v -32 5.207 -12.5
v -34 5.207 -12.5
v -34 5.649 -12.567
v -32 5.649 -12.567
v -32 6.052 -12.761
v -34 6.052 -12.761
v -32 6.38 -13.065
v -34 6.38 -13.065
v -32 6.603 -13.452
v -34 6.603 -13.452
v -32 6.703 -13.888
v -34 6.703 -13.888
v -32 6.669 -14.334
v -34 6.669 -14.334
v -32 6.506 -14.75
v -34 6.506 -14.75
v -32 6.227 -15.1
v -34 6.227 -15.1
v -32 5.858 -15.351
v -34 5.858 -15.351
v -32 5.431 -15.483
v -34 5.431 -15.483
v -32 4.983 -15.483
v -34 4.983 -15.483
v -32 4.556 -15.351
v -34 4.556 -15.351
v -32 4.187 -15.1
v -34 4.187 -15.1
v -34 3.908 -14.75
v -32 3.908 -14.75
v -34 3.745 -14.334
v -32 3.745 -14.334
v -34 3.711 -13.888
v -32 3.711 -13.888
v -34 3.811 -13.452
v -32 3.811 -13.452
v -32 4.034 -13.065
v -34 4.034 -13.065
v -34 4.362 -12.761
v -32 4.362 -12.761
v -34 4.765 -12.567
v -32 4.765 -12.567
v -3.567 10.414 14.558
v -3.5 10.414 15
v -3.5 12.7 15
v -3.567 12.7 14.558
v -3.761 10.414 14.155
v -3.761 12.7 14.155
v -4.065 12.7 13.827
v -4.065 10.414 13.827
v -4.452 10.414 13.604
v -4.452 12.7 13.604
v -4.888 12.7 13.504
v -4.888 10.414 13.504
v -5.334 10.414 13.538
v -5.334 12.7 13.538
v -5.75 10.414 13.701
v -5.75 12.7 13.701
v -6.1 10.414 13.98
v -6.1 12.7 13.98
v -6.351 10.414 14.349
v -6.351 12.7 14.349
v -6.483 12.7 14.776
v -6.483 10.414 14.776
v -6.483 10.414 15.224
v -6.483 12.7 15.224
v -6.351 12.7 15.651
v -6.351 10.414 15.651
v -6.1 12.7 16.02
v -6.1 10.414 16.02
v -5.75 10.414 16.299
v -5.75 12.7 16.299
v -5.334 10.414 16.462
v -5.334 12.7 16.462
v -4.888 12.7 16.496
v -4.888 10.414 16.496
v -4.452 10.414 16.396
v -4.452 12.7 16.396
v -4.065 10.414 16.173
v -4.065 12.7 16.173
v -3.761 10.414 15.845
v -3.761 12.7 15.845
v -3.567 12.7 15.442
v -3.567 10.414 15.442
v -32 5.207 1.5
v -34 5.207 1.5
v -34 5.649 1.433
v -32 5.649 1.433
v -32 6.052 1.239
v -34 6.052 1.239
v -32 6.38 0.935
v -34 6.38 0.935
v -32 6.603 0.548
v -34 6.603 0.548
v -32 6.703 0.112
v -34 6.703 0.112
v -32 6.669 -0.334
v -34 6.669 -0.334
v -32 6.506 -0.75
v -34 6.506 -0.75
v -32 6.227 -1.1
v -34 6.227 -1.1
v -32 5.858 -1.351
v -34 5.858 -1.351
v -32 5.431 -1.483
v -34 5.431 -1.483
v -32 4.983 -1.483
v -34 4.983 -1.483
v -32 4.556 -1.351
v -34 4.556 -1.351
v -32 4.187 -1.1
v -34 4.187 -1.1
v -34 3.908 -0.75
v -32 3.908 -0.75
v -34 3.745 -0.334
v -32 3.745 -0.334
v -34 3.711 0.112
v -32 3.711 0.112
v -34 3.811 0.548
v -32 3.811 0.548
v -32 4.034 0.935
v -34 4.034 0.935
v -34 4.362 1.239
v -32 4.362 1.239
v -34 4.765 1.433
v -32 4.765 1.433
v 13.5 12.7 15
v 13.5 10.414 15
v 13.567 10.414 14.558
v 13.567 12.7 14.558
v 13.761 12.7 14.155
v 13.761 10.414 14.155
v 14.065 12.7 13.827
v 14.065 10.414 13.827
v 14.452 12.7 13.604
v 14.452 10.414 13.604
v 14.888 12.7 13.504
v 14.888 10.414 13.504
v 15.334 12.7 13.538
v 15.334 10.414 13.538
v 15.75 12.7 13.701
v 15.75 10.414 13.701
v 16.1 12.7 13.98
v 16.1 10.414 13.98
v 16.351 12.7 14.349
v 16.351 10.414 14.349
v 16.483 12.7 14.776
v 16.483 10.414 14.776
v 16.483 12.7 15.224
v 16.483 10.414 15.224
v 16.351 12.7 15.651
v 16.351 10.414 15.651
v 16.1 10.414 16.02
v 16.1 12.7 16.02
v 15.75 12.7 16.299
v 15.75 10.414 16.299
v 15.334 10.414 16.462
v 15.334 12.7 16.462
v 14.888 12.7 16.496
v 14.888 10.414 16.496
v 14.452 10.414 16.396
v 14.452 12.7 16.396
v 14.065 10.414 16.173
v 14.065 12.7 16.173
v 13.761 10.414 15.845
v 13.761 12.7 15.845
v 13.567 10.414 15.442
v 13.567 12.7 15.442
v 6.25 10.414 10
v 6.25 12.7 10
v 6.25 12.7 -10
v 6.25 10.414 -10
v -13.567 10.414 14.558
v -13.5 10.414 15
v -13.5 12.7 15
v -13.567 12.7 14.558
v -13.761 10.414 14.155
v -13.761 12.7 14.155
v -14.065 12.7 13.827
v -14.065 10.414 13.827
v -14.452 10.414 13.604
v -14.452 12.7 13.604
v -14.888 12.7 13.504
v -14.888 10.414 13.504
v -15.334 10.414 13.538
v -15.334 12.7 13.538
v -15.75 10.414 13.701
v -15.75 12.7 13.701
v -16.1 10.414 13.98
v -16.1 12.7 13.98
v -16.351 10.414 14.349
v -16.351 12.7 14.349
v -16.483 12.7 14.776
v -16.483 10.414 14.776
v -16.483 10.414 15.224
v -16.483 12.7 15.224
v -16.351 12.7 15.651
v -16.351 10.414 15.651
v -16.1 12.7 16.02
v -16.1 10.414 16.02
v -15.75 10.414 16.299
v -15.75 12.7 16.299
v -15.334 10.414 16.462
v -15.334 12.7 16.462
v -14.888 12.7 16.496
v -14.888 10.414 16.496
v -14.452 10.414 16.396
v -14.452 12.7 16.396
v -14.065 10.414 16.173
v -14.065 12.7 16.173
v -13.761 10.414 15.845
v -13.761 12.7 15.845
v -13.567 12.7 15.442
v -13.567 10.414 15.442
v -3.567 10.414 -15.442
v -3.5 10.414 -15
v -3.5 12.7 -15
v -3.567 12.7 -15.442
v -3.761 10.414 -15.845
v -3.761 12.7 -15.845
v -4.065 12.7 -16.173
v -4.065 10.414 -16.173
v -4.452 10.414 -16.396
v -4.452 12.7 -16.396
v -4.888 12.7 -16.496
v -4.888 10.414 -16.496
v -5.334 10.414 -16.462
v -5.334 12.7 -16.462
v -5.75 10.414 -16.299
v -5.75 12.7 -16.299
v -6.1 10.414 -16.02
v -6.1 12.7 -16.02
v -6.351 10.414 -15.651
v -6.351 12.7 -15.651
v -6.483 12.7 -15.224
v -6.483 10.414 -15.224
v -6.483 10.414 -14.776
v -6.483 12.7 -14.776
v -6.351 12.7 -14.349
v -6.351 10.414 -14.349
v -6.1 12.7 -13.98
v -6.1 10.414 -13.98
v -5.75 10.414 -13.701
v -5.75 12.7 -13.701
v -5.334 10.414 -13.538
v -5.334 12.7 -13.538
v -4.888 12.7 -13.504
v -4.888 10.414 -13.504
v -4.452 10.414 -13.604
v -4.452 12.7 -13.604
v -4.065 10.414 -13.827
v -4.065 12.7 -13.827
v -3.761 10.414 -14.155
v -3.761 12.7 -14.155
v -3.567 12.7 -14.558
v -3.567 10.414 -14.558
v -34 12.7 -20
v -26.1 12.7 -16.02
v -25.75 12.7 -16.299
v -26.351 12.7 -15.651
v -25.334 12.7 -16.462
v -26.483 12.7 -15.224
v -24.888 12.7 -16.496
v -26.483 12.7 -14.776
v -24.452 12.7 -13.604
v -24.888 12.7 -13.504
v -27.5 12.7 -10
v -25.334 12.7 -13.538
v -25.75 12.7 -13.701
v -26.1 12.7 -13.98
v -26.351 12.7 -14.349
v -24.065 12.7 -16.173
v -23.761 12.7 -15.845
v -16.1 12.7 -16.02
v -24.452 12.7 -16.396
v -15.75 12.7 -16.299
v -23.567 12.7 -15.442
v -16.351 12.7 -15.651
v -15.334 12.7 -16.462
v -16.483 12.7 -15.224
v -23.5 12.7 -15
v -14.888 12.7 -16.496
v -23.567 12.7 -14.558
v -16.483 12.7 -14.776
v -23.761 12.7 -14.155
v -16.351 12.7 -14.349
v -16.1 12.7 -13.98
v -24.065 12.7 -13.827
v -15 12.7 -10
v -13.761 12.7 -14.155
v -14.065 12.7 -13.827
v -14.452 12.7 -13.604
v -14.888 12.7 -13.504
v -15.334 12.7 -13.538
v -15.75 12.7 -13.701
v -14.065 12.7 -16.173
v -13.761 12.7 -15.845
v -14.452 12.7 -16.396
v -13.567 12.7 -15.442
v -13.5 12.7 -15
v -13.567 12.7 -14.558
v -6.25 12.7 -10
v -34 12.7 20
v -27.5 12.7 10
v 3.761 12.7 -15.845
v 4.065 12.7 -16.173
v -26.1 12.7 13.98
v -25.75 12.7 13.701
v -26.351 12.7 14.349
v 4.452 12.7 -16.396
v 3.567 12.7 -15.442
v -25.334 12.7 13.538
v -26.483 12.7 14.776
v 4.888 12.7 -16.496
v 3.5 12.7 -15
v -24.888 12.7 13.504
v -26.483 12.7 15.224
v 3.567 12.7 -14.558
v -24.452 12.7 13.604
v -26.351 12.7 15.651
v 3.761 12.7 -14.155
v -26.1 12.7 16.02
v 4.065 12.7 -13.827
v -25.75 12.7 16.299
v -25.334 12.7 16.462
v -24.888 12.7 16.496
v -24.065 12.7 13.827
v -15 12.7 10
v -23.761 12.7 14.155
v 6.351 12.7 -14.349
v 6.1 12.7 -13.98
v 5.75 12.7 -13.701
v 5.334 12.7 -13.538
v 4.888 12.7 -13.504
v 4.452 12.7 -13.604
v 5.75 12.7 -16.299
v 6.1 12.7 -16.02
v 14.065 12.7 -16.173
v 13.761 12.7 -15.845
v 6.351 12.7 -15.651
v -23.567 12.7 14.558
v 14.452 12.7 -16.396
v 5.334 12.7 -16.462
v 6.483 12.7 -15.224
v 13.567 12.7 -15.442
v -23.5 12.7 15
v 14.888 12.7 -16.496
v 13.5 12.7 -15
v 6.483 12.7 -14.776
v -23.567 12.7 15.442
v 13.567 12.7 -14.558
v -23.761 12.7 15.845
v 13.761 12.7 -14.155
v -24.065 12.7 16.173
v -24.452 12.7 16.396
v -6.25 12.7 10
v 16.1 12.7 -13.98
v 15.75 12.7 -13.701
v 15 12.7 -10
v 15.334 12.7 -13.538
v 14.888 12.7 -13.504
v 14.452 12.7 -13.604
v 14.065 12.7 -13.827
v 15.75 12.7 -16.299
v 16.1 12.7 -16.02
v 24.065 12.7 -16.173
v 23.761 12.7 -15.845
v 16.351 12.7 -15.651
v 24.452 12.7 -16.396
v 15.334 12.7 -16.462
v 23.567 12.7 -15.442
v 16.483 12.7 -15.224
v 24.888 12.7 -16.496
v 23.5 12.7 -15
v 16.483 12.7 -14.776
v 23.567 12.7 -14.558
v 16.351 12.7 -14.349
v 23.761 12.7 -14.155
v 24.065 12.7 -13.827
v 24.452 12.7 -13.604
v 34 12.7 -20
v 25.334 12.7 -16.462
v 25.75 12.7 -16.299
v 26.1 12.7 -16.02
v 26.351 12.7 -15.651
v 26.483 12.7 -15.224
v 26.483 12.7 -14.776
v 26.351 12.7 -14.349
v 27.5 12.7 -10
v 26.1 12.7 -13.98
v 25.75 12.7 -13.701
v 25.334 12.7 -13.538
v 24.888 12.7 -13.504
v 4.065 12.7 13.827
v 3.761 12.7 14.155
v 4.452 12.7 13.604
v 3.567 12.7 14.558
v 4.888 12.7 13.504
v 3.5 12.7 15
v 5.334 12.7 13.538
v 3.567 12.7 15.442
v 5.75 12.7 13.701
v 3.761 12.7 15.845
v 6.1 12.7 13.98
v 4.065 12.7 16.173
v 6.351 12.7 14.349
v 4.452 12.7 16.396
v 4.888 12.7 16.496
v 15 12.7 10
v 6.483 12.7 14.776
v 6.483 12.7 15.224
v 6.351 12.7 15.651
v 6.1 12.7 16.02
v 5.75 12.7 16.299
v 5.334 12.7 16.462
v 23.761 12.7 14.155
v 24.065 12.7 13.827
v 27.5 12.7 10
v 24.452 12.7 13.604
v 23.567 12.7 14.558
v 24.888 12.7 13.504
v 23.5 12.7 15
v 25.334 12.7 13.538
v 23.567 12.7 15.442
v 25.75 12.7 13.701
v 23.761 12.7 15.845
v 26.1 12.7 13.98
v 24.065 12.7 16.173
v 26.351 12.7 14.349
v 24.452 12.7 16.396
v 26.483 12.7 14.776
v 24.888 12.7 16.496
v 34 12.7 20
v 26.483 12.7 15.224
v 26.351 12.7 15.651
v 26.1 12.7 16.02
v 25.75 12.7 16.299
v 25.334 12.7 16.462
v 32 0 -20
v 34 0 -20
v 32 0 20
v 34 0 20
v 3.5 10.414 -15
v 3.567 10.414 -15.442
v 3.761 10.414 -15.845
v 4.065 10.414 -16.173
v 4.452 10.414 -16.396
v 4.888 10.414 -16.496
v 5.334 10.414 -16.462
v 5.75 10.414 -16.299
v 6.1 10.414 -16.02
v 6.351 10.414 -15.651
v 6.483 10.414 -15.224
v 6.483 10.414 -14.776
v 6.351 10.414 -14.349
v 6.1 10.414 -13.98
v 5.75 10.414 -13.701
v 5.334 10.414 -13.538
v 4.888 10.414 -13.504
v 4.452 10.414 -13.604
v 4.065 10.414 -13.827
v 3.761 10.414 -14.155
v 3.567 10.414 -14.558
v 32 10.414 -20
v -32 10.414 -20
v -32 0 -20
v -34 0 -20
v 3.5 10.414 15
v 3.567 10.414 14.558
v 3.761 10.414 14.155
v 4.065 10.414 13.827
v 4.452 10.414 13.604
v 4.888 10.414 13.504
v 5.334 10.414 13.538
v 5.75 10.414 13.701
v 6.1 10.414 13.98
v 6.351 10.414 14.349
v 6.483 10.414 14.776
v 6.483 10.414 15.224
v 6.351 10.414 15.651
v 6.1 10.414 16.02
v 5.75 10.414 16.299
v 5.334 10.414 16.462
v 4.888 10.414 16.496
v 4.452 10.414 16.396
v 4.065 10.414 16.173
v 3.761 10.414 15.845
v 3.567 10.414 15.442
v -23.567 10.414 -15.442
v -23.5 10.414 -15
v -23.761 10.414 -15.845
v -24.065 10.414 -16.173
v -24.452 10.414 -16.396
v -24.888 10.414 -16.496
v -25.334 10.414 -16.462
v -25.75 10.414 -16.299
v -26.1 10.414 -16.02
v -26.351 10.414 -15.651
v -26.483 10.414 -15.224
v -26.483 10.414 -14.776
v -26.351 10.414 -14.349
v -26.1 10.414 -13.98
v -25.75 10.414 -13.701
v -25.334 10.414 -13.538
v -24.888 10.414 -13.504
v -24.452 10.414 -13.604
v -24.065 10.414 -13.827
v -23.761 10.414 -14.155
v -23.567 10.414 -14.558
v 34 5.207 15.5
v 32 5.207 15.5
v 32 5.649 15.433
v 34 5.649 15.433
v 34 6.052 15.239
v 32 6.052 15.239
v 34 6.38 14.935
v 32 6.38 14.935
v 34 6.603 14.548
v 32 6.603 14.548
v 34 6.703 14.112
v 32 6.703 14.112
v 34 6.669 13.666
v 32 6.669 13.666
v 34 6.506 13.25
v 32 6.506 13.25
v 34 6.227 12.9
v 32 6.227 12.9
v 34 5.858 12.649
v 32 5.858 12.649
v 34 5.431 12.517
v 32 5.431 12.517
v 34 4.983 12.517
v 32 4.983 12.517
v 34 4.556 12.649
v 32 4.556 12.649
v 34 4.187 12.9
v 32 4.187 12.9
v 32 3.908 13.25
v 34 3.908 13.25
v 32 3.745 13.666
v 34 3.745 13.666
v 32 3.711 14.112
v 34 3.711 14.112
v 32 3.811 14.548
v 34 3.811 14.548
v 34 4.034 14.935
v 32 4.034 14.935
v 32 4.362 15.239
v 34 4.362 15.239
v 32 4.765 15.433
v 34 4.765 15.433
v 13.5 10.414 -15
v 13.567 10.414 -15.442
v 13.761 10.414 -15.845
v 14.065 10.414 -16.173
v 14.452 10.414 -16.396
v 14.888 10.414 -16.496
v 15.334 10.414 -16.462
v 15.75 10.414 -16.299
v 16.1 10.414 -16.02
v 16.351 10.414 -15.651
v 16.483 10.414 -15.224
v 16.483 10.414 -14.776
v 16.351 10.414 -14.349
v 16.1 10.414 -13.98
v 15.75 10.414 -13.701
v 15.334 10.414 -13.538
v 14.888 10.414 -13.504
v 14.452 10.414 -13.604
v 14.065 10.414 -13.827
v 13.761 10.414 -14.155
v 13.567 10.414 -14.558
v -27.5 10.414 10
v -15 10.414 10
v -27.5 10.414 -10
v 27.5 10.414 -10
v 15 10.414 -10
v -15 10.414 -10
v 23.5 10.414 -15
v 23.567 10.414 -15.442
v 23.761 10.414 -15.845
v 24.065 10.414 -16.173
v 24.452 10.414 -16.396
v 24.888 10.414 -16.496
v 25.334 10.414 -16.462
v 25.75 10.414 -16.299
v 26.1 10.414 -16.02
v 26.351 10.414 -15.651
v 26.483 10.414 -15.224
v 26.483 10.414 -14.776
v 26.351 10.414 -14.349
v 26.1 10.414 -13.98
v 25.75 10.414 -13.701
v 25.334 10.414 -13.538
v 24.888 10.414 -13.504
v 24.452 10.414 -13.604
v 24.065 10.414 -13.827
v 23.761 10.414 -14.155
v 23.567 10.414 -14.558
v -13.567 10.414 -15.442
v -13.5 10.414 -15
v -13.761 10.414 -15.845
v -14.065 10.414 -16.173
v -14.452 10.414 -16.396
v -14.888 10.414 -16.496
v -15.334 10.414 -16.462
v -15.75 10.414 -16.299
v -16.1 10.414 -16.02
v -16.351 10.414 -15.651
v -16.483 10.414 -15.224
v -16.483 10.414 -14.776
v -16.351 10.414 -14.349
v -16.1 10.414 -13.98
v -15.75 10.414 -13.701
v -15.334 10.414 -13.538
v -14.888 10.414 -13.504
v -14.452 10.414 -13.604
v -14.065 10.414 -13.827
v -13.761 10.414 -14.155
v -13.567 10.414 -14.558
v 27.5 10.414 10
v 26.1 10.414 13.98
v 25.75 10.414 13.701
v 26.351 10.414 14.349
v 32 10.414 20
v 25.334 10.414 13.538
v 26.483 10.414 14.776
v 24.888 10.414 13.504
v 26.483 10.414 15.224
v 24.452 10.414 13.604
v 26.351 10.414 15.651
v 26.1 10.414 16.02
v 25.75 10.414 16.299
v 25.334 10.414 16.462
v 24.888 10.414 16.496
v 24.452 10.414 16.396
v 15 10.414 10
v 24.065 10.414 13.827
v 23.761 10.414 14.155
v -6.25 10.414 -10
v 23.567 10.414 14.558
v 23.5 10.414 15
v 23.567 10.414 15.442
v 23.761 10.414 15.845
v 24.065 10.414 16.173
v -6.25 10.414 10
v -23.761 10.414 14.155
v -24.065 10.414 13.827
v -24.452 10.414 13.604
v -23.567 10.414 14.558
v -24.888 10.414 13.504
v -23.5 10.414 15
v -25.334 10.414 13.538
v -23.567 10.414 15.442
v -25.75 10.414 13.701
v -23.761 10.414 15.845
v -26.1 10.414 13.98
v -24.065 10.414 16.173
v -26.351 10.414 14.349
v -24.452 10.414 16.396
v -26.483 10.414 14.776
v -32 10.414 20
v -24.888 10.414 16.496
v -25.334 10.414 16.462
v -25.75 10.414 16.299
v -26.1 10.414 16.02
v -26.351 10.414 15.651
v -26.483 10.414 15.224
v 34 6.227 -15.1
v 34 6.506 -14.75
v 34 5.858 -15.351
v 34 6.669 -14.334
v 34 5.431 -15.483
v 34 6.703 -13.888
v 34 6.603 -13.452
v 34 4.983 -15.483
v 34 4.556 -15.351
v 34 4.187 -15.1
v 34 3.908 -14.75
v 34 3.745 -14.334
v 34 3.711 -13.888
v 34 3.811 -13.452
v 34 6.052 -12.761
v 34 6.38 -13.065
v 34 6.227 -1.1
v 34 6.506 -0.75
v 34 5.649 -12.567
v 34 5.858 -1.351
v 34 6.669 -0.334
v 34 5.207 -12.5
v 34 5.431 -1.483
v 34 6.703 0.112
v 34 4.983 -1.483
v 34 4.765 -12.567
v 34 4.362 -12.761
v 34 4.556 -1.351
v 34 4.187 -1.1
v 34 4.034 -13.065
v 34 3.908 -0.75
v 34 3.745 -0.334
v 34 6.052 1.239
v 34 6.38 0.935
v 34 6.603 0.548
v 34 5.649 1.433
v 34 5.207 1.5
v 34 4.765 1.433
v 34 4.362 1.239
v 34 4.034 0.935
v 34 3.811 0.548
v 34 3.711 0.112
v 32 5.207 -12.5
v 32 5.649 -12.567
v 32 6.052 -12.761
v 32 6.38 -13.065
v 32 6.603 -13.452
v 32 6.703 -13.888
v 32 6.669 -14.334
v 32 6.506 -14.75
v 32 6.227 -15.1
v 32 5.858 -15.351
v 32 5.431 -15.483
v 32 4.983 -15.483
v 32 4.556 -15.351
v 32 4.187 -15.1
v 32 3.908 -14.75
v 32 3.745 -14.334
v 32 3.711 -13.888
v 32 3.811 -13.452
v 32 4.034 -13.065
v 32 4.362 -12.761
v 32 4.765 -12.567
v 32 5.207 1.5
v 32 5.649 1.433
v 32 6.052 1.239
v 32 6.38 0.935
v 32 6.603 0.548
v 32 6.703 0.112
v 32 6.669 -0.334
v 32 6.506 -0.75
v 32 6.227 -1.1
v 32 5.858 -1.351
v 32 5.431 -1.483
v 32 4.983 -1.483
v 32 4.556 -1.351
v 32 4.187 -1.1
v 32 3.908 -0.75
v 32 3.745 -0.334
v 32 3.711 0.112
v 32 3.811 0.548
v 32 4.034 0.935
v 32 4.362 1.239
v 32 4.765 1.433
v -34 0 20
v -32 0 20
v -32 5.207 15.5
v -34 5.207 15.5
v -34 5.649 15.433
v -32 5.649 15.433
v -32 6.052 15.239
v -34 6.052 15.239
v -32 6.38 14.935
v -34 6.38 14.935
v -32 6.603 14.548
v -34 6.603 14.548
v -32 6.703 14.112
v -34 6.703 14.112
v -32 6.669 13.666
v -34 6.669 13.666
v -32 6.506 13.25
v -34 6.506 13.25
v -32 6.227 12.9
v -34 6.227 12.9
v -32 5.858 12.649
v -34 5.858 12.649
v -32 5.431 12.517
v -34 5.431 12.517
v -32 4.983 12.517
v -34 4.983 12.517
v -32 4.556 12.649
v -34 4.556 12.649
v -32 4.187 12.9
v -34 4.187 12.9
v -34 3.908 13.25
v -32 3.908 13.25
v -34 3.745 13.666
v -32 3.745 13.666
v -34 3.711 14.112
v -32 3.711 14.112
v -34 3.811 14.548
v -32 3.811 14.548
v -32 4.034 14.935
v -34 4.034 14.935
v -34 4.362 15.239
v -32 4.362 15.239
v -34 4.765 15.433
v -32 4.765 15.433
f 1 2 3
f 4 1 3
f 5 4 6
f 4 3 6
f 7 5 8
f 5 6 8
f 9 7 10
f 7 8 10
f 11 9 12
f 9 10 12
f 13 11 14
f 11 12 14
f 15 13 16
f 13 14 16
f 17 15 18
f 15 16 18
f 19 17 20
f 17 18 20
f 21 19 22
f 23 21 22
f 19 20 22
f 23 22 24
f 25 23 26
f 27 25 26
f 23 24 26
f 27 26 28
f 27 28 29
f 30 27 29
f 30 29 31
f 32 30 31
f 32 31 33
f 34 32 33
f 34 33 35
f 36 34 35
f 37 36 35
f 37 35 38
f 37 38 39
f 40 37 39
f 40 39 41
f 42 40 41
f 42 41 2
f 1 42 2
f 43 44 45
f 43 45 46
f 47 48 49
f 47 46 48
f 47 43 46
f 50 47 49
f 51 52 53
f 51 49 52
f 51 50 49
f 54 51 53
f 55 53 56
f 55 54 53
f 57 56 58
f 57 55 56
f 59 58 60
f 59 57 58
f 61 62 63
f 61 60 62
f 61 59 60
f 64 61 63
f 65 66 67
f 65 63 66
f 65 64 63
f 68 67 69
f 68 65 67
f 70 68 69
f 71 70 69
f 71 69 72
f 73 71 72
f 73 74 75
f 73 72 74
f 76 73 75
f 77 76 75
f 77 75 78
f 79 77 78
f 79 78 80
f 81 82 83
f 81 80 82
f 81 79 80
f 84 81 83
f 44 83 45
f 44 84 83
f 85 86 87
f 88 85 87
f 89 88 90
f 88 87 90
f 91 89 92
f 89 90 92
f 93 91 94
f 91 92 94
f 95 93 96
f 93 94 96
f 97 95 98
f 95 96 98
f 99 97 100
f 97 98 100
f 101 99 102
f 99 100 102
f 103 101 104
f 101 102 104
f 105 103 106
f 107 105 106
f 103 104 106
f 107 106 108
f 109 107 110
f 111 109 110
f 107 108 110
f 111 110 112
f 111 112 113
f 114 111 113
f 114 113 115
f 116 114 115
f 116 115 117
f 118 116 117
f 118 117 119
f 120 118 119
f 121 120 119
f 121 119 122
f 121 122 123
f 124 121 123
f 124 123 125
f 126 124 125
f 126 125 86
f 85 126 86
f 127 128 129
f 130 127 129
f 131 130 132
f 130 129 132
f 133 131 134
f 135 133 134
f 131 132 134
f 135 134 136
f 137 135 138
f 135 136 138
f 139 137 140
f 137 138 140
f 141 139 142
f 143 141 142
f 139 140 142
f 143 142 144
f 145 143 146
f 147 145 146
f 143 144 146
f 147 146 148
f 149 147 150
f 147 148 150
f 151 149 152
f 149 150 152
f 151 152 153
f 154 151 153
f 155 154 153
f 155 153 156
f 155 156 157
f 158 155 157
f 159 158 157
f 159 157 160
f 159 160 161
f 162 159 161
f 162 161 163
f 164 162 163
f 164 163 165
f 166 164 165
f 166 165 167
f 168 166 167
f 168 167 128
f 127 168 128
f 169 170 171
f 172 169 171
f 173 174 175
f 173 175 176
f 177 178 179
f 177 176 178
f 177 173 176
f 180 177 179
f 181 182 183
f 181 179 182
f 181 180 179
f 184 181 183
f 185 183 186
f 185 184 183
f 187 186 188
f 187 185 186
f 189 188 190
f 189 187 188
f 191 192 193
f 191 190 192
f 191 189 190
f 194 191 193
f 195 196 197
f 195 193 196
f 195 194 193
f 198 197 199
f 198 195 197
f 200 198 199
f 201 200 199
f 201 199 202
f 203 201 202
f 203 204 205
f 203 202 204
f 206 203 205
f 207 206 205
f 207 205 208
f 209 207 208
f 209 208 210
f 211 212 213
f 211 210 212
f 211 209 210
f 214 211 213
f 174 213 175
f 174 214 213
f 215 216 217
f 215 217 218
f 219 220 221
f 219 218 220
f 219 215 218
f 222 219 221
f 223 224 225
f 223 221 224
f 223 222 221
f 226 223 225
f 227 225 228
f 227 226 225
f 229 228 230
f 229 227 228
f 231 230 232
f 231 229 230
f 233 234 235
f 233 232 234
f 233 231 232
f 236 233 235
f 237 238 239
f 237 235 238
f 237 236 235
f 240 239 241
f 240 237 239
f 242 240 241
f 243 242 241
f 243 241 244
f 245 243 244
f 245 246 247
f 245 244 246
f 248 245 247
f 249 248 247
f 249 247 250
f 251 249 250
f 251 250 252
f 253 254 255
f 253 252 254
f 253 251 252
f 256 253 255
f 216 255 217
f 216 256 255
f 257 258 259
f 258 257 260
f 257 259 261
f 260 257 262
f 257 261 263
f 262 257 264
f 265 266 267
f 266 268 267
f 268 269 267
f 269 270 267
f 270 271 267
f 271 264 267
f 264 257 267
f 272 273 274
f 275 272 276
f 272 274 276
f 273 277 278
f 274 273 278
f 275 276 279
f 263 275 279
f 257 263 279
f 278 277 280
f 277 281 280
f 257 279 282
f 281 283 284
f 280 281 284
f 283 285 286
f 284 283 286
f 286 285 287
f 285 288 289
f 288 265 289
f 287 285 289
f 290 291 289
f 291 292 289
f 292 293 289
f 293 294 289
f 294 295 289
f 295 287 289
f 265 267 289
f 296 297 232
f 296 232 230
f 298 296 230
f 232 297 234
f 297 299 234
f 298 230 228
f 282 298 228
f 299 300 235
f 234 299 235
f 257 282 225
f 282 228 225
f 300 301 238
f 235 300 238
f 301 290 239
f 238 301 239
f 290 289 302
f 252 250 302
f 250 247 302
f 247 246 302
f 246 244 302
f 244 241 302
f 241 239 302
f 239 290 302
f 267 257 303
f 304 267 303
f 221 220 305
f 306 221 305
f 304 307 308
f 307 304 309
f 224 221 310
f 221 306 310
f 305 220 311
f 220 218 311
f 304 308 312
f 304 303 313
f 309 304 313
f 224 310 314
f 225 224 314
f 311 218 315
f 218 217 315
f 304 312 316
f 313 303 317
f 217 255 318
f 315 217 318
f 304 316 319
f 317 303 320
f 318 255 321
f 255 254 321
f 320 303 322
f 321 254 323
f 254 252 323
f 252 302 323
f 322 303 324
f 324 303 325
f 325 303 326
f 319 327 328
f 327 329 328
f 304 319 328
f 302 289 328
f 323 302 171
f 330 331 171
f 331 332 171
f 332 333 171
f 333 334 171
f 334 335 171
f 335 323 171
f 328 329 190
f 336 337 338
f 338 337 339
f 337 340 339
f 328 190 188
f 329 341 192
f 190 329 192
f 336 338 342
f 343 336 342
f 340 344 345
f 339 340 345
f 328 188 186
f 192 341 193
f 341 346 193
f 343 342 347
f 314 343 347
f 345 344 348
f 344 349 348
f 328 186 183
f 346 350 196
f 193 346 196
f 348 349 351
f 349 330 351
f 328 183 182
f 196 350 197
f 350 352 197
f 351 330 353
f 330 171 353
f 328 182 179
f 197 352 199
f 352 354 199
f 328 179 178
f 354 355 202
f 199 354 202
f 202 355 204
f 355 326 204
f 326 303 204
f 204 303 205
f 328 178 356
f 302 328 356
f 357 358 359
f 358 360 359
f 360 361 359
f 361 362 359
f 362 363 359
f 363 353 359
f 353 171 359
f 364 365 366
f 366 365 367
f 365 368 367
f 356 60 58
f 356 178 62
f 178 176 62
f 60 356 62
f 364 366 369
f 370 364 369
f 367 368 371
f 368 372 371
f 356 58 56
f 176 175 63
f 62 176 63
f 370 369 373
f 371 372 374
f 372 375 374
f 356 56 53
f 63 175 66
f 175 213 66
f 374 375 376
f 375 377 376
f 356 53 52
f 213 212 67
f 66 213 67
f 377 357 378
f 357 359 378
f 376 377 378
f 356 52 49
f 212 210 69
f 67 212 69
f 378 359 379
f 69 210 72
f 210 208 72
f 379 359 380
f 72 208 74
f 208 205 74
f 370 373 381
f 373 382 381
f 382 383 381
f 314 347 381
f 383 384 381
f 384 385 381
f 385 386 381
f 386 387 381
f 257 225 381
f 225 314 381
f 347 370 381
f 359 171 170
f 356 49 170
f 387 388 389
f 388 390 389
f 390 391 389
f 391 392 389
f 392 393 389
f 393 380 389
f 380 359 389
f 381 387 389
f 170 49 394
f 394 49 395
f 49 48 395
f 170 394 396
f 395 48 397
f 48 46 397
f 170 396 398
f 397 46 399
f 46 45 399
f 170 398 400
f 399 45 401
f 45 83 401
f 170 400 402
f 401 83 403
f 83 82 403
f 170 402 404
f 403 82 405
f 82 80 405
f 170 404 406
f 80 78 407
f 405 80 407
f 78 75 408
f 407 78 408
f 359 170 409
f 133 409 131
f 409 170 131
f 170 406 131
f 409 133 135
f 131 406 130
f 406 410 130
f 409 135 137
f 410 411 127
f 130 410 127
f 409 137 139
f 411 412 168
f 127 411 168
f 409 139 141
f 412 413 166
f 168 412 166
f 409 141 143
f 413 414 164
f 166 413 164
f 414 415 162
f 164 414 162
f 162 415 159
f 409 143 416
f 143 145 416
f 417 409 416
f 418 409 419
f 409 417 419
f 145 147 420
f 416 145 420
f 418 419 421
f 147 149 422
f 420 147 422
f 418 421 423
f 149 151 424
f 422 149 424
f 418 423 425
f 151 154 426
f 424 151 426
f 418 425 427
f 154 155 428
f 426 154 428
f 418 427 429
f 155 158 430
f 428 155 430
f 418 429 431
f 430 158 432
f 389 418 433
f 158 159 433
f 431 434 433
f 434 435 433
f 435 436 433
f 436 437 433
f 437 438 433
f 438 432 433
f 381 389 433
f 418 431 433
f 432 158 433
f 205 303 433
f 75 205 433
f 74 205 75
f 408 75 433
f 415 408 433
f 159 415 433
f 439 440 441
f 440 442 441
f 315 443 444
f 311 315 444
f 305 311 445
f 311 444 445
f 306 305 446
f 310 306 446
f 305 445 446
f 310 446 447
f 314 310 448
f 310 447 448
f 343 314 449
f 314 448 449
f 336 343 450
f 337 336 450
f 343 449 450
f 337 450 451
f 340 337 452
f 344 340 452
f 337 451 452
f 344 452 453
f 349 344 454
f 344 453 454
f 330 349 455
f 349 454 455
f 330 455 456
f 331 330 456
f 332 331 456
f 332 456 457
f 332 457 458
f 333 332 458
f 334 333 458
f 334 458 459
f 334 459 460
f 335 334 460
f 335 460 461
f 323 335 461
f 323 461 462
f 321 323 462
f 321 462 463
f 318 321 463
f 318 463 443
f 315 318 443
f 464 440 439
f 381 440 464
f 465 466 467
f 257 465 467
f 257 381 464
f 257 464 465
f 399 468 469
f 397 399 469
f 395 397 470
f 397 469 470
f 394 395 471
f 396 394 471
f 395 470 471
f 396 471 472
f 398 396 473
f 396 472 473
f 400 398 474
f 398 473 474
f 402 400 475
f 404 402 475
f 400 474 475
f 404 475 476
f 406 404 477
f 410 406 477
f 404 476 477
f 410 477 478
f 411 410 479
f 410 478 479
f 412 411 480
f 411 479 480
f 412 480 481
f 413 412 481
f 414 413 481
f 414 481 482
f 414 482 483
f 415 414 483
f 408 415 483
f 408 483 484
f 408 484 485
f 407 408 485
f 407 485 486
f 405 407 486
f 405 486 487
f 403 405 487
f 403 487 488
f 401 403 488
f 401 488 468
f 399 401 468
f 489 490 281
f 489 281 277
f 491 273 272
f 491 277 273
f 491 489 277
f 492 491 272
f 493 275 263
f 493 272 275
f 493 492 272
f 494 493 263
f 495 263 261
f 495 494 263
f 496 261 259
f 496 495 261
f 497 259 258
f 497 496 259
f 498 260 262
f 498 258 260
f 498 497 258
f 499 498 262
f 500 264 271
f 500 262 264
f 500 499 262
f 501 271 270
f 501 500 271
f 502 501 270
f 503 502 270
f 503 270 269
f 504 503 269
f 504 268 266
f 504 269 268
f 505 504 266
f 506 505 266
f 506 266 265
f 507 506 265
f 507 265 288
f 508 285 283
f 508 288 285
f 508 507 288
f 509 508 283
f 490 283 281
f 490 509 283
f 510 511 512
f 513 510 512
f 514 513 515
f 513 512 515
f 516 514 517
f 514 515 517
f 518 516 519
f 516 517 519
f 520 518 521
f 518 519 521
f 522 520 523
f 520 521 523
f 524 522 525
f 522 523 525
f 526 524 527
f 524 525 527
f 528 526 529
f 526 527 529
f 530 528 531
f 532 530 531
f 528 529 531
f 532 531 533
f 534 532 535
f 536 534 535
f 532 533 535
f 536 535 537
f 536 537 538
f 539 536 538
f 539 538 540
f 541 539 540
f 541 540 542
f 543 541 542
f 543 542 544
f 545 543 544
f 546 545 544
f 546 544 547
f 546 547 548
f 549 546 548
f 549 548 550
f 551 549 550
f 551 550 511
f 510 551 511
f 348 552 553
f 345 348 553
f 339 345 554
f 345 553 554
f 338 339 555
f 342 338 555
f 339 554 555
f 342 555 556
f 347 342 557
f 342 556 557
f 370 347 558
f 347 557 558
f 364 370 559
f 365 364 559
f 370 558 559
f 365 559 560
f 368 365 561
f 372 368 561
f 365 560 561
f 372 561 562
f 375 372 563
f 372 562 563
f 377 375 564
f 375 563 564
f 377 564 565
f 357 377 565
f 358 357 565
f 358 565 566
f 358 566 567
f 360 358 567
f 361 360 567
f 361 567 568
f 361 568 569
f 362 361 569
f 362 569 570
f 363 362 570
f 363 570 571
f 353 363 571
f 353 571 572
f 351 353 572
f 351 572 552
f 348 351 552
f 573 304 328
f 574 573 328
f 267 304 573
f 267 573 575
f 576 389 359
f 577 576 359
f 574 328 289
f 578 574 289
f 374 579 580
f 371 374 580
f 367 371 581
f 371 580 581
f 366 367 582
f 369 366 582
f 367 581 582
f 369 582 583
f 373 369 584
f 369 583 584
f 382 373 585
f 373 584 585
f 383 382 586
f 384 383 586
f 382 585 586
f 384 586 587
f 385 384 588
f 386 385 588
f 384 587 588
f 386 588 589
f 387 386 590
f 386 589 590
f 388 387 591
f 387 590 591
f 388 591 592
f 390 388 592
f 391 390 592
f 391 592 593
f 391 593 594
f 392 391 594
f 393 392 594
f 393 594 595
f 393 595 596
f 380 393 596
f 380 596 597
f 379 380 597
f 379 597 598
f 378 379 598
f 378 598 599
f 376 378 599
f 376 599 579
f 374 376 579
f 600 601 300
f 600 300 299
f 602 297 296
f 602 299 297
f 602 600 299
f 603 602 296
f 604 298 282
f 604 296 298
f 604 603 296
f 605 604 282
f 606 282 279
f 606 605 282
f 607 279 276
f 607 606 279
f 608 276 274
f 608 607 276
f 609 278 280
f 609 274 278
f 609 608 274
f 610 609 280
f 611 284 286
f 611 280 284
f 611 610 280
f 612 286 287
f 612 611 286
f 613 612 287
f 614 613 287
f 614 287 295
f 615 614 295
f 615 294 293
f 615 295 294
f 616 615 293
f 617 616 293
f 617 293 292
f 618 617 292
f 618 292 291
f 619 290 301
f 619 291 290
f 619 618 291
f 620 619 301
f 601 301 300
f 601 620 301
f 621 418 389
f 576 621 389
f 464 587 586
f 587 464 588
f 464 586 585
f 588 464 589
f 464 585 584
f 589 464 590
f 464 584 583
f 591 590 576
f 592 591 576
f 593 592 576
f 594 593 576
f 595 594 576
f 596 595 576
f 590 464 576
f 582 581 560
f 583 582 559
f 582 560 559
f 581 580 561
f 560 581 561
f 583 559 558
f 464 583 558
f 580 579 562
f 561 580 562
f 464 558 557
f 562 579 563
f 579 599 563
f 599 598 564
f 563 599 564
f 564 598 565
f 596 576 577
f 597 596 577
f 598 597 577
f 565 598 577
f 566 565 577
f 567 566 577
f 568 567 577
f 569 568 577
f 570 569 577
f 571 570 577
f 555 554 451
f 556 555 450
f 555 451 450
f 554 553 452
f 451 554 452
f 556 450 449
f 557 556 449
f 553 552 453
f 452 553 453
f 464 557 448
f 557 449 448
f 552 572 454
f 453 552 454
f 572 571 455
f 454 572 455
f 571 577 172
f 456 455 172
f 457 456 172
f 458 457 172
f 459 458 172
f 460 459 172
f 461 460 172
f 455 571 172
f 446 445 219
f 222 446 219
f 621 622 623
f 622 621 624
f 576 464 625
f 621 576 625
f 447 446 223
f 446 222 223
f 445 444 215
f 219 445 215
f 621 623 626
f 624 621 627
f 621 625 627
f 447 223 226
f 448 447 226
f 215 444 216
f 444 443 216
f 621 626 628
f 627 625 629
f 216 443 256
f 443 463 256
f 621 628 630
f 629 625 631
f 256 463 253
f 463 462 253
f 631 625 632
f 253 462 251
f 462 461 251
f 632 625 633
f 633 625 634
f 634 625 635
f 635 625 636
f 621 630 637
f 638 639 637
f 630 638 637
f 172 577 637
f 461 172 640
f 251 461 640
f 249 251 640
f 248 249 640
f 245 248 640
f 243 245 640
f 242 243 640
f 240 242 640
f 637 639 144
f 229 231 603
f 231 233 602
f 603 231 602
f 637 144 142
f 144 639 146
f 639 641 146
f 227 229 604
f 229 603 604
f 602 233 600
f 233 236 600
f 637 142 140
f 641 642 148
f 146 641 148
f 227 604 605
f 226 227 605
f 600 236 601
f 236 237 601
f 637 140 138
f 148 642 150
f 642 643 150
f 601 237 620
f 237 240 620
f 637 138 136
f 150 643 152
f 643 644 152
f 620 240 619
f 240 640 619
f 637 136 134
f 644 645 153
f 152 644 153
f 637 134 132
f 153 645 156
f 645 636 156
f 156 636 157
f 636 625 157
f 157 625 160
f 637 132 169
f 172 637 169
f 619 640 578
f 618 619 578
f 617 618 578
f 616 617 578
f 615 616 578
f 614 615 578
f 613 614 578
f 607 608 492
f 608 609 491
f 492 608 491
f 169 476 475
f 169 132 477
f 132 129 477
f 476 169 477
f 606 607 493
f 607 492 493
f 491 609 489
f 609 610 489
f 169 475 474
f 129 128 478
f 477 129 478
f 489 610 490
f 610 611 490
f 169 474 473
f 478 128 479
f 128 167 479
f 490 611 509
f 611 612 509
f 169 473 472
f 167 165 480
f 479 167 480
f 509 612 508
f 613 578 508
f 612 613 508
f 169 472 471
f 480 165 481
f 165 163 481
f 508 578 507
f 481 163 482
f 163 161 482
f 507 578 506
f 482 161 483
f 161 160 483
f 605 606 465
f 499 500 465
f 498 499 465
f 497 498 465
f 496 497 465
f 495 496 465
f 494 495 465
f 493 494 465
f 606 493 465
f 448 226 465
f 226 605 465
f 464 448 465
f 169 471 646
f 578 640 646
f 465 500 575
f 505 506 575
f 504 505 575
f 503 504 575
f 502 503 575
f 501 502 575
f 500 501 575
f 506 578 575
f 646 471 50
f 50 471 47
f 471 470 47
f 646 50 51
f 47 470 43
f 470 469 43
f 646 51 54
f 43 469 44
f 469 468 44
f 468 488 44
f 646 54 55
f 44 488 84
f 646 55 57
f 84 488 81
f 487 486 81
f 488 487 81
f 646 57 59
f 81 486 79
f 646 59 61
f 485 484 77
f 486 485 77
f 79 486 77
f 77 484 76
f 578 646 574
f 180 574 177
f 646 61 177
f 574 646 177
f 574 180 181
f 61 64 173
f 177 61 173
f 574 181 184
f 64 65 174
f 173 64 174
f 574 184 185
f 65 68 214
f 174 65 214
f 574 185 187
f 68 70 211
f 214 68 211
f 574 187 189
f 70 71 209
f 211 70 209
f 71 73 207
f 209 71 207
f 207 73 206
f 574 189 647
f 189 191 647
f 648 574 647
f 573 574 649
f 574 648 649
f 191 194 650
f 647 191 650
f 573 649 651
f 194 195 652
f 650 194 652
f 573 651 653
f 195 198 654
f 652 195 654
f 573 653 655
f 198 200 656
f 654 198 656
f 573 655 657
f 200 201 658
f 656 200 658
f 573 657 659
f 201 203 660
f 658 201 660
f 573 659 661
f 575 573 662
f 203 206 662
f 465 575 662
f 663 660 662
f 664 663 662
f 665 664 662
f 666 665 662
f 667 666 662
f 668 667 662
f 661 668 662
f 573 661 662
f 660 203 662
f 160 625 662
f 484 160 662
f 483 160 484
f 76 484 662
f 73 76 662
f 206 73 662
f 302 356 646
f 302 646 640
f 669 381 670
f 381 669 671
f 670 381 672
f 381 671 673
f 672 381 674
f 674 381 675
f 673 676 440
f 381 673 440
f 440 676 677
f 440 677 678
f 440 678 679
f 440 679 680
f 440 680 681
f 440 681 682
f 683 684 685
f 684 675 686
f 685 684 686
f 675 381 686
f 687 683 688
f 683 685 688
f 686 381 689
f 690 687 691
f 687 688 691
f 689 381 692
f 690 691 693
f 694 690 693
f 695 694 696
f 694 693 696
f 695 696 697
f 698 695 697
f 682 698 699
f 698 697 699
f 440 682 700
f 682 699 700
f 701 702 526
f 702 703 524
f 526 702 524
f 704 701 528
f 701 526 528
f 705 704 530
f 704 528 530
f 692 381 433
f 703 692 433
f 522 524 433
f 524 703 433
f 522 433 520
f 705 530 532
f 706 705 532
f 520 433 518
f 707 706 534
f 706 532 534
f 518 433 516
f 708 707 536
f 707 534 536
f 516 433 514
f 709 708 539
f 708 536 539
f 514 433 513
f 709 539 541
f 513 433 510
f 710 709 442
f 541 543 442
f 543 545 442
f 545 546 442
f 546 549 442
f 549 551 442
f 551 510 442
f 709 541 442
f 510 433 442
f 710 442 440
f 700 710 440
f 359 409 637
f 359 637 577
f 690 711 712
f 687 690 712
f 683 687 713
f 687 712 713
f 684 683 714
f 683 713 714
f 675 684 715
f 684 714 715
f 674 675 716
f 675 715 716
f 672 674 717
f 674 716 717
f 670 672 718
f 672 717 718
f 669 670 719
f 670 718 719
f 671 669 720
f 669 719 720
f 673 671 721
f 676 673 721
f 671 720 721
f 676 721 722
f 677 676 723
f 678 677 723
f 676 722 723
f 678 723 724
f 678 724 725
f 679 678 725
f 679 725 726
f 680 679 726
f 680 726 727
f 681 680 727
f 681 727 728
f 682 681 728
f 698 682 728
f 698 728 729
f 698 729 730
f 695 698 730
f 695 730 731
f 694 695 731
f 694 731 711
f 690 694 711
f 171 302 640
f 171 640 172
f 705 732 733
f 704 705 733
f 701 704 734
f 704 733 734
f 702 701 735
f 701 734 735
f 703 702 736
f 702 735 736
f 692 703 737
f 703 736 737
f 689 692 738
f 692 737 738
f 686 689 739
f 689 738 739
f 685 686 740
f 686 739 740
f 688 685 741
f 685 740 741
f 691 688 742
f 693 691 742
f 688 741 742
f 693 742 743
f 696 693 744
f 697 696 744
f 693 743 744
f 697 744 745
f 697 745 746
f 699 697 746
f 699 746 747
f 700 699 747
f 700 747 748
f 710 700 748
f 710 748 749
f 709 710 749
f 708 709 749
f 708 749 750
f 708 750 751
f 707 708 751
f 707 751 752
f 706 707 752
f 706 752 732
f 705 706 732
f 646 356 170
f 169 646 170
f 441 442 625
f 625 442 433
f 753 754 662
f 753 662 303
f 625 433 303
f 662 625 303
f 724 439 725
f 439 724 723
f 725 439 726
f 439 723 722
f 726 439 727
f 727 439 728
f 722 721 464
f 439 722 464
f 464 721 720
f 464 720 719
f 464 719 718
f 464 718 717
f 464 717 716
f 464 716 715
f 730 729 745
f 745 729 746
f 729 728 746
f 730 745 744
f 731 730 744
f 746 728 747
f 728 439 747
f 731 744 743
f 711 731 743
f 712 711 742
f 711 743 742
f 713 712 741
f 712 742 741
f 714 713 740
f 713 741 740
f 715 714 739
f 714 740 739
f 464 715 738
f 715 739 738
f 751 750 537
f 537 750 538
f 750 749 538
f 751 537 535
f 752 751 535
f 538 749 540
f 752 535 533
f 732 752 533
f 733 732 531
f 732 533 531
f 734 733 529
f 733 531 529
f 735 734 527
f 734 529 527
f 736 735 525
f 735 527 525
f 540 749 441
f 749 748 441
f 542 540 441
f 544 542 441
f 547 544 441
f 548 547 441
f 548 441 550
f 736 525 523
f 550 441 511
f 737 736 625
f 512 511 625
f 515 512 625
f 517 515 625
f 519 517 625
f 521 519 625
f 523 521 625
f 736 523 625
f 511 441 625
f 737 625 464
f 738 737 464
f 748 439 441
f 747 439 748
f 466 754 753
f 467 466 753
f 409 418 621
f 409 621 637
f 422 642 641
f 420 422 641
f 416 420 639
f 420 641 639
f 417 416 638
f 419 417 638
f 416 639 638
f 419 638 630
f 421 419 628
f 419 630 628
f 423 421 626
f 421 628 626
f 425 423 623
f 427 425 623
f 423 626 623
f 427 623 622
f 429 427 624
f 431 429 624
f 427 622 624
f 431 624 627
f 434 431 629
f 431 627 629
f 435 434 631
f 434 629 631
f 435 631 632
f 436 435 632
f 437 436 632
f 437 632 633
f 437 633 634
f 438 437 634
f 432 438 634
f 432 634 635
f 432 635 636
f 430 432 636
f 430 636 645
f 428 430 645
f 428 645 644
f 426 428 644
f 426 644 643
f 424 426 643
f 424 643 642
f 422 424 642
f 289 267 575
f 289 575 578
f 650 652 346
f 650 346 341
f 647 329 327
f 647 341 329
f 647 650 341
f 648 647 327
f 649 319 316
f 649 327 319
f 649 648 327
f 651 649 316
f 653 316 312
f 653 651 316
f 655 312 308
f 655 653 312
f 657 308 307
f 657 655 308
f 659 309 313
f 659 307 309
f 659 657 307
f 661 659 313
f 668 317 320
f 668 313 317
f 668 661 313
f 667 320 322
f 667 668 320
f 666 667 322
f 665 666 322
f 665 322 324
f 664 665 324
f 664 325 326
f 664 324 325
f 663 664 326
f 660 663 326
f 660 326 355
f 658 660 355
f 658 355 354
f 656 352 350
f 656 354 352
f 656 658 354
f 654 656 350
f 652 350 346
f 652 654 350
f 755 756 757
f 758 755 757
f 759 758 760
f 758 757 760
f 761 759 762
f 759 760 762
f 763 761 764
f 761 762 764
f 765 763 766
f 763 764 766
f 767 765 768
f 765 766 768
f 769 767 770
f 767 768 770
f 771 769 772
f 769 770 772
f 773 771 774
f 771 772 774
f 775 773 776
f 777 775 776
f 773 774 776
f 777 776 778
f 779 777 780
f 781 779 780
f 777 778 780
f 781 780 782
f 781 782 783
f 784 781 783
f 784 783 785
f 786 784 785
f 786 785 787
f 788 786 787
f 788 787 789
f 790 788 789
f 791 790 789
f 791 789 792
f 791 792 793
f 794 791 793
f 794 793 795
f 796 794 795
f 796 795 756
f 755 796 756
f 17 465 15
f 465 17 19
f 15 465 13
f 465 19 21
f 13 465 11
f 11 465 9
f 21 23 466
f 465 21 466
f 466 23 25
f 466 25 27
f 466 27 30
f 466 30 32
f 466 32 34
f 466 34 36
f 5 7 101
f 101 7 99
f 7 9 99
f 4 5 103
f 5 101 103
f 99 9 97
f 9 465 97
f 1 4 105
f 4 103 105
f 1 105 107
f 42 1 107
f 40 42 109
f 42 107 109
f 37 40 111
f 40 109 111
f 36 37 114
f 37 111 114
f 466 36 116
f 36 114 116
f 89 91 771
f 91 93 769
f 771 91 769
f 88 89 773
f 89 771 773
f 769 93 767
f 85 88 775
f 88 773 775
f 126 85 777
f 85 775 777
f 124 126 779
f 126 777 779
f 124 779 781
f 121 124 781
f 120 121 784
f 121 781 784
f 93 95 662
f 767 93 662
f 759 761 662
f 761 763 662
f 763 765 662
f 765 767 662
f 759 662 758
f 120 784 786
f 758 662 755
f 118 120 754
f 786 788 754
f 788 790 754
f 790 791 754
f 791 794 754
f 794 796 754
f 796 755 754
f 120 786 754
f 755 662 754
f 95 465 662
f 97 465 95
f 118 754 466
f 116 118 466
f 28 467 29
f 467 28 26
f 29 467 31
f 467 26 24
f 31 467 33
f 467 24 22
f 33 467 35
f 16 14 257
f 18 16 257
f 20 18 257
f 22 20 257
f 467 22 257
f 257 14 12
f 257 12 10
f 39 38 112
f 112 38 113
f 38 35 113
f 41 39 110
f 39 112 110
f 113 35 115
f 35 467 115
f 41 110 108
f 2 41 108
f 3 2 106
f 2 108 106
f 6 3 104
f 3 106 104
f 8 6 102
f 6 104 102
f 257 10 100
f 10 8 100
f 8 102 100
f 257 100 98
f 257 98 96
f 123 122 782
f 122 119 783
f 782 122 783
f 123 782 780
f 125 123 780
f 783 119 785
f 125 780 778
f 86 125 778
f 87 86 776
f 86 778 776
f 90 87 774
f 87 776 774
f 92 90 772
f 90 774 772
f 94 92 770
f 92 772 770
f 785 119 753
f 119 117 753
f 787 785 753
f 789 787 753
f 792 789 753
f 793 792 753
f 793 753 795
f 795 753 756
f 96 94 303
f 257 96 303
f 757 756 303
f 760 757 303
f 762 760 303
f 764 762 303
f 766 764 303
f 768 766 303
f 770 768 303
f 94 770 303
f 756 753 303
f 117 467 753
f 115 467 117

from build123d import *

# Parameters (mm, degrees)
BOSS_EXTRUDE1_DEPTH   = 20
F_3_0MM_DOWEL_HOLE1_D = 3
F_3_0MM_DOWEL_HOLE2_D = 3
SKETCH10_W            = 12.5
SKETCH10_H            = 20
CUT_EXTRUDE1_DEPTH    = 10
SKETCH11_W            = 12.5
SKETCH11_H            = 20
CUT_EXTRUDE2_DEPTH    = 10


with BuildPart() as part:
    # Sketch1 → Boss-Extrude1 (new body, symmetric)
    with BuildSketch(Plane.XY):
        Polygon((-34, 0), (-34, 12.7), (34, 12.7), (34, 0), (32, 0), (32, 10.414), (-32, 10.414), (-32, 0), align=None)
    extrude(amount=BOSS_EXTRUDE1_DEPTH, both=True)

    # Ø3.0mm Dowel Hole1 (through all)
    with Locations(Plane(origin=(34, 0, 0), x_dir=(0, 0, -1), z_dir=(1, 0, 0))):
        with Locations((-14, 5.207), (14, 5.207), (0, 5.207)):
            Hole(F_3_0MM_DOWEL_HOLE1_D / 2)

    # Ø3.0mm Dowel Hole2 (through all)
    with Locations(Plane(origin=(0, 12.7, 0), x_dir=(1, 0, 0), z_dir=(0, 1, 0))):
        with Locations((25, -15), (15, -15), (5, -15), (25, 15), (15, 15), (5, 15)):
            f_3_0mm_dowel_hole2 = Hole(F_3_0MM_DOWEL_HOLE2_D / 2)

    # Sketch10 → Cut-Extrude1 (cut)
    with BuildSketch(Plane(origin=(0, 12.7, 0), x_dir=(1, 0, 0), z_dir=(0, 1, 0))):
        with Locations((-21.25, 0)):
            Rectangle(SKETCH10_W, SKETCH10_H)
    cut_extrude1 = extrude(amount=-CUT_EXTRUDE1_DEPTH, mode=Mode.SUBTRACT)

    # Mirror1: Cut-Extrude1 across plane
    add(cut_extrude1.mirror(Plane(origin=(0, 0, 0), x_dir=(0, 0, 1), z_dir=(1, 0, 0))), mode=Mode.SUBTRACT)

    # Sketch11 → Cut-Extrude2 (cut)
    with BuildSketch(Plane(origin=(0, 12.7, 0), x_dir=(1, 0, 0), z_dir=(0, 1, 0))):
        Rectangle(SKETCH11_W, SKETCH11_H)
    extrude(amount=-CUT_EXTRUDE2_DEPTH, mode=Mode.SUBTRACT)

    # Mirror2: Ø3.0mm Dowel Hole2 across plane
    add(f_3_0mm_dowel_hole2.mirror(Plane(origin=(0, 0, 0), x_dir=(0, 0, 1), z_dir=(1, 0, 0))), mode=Mode.SUBTRACT)


solid = part.part
